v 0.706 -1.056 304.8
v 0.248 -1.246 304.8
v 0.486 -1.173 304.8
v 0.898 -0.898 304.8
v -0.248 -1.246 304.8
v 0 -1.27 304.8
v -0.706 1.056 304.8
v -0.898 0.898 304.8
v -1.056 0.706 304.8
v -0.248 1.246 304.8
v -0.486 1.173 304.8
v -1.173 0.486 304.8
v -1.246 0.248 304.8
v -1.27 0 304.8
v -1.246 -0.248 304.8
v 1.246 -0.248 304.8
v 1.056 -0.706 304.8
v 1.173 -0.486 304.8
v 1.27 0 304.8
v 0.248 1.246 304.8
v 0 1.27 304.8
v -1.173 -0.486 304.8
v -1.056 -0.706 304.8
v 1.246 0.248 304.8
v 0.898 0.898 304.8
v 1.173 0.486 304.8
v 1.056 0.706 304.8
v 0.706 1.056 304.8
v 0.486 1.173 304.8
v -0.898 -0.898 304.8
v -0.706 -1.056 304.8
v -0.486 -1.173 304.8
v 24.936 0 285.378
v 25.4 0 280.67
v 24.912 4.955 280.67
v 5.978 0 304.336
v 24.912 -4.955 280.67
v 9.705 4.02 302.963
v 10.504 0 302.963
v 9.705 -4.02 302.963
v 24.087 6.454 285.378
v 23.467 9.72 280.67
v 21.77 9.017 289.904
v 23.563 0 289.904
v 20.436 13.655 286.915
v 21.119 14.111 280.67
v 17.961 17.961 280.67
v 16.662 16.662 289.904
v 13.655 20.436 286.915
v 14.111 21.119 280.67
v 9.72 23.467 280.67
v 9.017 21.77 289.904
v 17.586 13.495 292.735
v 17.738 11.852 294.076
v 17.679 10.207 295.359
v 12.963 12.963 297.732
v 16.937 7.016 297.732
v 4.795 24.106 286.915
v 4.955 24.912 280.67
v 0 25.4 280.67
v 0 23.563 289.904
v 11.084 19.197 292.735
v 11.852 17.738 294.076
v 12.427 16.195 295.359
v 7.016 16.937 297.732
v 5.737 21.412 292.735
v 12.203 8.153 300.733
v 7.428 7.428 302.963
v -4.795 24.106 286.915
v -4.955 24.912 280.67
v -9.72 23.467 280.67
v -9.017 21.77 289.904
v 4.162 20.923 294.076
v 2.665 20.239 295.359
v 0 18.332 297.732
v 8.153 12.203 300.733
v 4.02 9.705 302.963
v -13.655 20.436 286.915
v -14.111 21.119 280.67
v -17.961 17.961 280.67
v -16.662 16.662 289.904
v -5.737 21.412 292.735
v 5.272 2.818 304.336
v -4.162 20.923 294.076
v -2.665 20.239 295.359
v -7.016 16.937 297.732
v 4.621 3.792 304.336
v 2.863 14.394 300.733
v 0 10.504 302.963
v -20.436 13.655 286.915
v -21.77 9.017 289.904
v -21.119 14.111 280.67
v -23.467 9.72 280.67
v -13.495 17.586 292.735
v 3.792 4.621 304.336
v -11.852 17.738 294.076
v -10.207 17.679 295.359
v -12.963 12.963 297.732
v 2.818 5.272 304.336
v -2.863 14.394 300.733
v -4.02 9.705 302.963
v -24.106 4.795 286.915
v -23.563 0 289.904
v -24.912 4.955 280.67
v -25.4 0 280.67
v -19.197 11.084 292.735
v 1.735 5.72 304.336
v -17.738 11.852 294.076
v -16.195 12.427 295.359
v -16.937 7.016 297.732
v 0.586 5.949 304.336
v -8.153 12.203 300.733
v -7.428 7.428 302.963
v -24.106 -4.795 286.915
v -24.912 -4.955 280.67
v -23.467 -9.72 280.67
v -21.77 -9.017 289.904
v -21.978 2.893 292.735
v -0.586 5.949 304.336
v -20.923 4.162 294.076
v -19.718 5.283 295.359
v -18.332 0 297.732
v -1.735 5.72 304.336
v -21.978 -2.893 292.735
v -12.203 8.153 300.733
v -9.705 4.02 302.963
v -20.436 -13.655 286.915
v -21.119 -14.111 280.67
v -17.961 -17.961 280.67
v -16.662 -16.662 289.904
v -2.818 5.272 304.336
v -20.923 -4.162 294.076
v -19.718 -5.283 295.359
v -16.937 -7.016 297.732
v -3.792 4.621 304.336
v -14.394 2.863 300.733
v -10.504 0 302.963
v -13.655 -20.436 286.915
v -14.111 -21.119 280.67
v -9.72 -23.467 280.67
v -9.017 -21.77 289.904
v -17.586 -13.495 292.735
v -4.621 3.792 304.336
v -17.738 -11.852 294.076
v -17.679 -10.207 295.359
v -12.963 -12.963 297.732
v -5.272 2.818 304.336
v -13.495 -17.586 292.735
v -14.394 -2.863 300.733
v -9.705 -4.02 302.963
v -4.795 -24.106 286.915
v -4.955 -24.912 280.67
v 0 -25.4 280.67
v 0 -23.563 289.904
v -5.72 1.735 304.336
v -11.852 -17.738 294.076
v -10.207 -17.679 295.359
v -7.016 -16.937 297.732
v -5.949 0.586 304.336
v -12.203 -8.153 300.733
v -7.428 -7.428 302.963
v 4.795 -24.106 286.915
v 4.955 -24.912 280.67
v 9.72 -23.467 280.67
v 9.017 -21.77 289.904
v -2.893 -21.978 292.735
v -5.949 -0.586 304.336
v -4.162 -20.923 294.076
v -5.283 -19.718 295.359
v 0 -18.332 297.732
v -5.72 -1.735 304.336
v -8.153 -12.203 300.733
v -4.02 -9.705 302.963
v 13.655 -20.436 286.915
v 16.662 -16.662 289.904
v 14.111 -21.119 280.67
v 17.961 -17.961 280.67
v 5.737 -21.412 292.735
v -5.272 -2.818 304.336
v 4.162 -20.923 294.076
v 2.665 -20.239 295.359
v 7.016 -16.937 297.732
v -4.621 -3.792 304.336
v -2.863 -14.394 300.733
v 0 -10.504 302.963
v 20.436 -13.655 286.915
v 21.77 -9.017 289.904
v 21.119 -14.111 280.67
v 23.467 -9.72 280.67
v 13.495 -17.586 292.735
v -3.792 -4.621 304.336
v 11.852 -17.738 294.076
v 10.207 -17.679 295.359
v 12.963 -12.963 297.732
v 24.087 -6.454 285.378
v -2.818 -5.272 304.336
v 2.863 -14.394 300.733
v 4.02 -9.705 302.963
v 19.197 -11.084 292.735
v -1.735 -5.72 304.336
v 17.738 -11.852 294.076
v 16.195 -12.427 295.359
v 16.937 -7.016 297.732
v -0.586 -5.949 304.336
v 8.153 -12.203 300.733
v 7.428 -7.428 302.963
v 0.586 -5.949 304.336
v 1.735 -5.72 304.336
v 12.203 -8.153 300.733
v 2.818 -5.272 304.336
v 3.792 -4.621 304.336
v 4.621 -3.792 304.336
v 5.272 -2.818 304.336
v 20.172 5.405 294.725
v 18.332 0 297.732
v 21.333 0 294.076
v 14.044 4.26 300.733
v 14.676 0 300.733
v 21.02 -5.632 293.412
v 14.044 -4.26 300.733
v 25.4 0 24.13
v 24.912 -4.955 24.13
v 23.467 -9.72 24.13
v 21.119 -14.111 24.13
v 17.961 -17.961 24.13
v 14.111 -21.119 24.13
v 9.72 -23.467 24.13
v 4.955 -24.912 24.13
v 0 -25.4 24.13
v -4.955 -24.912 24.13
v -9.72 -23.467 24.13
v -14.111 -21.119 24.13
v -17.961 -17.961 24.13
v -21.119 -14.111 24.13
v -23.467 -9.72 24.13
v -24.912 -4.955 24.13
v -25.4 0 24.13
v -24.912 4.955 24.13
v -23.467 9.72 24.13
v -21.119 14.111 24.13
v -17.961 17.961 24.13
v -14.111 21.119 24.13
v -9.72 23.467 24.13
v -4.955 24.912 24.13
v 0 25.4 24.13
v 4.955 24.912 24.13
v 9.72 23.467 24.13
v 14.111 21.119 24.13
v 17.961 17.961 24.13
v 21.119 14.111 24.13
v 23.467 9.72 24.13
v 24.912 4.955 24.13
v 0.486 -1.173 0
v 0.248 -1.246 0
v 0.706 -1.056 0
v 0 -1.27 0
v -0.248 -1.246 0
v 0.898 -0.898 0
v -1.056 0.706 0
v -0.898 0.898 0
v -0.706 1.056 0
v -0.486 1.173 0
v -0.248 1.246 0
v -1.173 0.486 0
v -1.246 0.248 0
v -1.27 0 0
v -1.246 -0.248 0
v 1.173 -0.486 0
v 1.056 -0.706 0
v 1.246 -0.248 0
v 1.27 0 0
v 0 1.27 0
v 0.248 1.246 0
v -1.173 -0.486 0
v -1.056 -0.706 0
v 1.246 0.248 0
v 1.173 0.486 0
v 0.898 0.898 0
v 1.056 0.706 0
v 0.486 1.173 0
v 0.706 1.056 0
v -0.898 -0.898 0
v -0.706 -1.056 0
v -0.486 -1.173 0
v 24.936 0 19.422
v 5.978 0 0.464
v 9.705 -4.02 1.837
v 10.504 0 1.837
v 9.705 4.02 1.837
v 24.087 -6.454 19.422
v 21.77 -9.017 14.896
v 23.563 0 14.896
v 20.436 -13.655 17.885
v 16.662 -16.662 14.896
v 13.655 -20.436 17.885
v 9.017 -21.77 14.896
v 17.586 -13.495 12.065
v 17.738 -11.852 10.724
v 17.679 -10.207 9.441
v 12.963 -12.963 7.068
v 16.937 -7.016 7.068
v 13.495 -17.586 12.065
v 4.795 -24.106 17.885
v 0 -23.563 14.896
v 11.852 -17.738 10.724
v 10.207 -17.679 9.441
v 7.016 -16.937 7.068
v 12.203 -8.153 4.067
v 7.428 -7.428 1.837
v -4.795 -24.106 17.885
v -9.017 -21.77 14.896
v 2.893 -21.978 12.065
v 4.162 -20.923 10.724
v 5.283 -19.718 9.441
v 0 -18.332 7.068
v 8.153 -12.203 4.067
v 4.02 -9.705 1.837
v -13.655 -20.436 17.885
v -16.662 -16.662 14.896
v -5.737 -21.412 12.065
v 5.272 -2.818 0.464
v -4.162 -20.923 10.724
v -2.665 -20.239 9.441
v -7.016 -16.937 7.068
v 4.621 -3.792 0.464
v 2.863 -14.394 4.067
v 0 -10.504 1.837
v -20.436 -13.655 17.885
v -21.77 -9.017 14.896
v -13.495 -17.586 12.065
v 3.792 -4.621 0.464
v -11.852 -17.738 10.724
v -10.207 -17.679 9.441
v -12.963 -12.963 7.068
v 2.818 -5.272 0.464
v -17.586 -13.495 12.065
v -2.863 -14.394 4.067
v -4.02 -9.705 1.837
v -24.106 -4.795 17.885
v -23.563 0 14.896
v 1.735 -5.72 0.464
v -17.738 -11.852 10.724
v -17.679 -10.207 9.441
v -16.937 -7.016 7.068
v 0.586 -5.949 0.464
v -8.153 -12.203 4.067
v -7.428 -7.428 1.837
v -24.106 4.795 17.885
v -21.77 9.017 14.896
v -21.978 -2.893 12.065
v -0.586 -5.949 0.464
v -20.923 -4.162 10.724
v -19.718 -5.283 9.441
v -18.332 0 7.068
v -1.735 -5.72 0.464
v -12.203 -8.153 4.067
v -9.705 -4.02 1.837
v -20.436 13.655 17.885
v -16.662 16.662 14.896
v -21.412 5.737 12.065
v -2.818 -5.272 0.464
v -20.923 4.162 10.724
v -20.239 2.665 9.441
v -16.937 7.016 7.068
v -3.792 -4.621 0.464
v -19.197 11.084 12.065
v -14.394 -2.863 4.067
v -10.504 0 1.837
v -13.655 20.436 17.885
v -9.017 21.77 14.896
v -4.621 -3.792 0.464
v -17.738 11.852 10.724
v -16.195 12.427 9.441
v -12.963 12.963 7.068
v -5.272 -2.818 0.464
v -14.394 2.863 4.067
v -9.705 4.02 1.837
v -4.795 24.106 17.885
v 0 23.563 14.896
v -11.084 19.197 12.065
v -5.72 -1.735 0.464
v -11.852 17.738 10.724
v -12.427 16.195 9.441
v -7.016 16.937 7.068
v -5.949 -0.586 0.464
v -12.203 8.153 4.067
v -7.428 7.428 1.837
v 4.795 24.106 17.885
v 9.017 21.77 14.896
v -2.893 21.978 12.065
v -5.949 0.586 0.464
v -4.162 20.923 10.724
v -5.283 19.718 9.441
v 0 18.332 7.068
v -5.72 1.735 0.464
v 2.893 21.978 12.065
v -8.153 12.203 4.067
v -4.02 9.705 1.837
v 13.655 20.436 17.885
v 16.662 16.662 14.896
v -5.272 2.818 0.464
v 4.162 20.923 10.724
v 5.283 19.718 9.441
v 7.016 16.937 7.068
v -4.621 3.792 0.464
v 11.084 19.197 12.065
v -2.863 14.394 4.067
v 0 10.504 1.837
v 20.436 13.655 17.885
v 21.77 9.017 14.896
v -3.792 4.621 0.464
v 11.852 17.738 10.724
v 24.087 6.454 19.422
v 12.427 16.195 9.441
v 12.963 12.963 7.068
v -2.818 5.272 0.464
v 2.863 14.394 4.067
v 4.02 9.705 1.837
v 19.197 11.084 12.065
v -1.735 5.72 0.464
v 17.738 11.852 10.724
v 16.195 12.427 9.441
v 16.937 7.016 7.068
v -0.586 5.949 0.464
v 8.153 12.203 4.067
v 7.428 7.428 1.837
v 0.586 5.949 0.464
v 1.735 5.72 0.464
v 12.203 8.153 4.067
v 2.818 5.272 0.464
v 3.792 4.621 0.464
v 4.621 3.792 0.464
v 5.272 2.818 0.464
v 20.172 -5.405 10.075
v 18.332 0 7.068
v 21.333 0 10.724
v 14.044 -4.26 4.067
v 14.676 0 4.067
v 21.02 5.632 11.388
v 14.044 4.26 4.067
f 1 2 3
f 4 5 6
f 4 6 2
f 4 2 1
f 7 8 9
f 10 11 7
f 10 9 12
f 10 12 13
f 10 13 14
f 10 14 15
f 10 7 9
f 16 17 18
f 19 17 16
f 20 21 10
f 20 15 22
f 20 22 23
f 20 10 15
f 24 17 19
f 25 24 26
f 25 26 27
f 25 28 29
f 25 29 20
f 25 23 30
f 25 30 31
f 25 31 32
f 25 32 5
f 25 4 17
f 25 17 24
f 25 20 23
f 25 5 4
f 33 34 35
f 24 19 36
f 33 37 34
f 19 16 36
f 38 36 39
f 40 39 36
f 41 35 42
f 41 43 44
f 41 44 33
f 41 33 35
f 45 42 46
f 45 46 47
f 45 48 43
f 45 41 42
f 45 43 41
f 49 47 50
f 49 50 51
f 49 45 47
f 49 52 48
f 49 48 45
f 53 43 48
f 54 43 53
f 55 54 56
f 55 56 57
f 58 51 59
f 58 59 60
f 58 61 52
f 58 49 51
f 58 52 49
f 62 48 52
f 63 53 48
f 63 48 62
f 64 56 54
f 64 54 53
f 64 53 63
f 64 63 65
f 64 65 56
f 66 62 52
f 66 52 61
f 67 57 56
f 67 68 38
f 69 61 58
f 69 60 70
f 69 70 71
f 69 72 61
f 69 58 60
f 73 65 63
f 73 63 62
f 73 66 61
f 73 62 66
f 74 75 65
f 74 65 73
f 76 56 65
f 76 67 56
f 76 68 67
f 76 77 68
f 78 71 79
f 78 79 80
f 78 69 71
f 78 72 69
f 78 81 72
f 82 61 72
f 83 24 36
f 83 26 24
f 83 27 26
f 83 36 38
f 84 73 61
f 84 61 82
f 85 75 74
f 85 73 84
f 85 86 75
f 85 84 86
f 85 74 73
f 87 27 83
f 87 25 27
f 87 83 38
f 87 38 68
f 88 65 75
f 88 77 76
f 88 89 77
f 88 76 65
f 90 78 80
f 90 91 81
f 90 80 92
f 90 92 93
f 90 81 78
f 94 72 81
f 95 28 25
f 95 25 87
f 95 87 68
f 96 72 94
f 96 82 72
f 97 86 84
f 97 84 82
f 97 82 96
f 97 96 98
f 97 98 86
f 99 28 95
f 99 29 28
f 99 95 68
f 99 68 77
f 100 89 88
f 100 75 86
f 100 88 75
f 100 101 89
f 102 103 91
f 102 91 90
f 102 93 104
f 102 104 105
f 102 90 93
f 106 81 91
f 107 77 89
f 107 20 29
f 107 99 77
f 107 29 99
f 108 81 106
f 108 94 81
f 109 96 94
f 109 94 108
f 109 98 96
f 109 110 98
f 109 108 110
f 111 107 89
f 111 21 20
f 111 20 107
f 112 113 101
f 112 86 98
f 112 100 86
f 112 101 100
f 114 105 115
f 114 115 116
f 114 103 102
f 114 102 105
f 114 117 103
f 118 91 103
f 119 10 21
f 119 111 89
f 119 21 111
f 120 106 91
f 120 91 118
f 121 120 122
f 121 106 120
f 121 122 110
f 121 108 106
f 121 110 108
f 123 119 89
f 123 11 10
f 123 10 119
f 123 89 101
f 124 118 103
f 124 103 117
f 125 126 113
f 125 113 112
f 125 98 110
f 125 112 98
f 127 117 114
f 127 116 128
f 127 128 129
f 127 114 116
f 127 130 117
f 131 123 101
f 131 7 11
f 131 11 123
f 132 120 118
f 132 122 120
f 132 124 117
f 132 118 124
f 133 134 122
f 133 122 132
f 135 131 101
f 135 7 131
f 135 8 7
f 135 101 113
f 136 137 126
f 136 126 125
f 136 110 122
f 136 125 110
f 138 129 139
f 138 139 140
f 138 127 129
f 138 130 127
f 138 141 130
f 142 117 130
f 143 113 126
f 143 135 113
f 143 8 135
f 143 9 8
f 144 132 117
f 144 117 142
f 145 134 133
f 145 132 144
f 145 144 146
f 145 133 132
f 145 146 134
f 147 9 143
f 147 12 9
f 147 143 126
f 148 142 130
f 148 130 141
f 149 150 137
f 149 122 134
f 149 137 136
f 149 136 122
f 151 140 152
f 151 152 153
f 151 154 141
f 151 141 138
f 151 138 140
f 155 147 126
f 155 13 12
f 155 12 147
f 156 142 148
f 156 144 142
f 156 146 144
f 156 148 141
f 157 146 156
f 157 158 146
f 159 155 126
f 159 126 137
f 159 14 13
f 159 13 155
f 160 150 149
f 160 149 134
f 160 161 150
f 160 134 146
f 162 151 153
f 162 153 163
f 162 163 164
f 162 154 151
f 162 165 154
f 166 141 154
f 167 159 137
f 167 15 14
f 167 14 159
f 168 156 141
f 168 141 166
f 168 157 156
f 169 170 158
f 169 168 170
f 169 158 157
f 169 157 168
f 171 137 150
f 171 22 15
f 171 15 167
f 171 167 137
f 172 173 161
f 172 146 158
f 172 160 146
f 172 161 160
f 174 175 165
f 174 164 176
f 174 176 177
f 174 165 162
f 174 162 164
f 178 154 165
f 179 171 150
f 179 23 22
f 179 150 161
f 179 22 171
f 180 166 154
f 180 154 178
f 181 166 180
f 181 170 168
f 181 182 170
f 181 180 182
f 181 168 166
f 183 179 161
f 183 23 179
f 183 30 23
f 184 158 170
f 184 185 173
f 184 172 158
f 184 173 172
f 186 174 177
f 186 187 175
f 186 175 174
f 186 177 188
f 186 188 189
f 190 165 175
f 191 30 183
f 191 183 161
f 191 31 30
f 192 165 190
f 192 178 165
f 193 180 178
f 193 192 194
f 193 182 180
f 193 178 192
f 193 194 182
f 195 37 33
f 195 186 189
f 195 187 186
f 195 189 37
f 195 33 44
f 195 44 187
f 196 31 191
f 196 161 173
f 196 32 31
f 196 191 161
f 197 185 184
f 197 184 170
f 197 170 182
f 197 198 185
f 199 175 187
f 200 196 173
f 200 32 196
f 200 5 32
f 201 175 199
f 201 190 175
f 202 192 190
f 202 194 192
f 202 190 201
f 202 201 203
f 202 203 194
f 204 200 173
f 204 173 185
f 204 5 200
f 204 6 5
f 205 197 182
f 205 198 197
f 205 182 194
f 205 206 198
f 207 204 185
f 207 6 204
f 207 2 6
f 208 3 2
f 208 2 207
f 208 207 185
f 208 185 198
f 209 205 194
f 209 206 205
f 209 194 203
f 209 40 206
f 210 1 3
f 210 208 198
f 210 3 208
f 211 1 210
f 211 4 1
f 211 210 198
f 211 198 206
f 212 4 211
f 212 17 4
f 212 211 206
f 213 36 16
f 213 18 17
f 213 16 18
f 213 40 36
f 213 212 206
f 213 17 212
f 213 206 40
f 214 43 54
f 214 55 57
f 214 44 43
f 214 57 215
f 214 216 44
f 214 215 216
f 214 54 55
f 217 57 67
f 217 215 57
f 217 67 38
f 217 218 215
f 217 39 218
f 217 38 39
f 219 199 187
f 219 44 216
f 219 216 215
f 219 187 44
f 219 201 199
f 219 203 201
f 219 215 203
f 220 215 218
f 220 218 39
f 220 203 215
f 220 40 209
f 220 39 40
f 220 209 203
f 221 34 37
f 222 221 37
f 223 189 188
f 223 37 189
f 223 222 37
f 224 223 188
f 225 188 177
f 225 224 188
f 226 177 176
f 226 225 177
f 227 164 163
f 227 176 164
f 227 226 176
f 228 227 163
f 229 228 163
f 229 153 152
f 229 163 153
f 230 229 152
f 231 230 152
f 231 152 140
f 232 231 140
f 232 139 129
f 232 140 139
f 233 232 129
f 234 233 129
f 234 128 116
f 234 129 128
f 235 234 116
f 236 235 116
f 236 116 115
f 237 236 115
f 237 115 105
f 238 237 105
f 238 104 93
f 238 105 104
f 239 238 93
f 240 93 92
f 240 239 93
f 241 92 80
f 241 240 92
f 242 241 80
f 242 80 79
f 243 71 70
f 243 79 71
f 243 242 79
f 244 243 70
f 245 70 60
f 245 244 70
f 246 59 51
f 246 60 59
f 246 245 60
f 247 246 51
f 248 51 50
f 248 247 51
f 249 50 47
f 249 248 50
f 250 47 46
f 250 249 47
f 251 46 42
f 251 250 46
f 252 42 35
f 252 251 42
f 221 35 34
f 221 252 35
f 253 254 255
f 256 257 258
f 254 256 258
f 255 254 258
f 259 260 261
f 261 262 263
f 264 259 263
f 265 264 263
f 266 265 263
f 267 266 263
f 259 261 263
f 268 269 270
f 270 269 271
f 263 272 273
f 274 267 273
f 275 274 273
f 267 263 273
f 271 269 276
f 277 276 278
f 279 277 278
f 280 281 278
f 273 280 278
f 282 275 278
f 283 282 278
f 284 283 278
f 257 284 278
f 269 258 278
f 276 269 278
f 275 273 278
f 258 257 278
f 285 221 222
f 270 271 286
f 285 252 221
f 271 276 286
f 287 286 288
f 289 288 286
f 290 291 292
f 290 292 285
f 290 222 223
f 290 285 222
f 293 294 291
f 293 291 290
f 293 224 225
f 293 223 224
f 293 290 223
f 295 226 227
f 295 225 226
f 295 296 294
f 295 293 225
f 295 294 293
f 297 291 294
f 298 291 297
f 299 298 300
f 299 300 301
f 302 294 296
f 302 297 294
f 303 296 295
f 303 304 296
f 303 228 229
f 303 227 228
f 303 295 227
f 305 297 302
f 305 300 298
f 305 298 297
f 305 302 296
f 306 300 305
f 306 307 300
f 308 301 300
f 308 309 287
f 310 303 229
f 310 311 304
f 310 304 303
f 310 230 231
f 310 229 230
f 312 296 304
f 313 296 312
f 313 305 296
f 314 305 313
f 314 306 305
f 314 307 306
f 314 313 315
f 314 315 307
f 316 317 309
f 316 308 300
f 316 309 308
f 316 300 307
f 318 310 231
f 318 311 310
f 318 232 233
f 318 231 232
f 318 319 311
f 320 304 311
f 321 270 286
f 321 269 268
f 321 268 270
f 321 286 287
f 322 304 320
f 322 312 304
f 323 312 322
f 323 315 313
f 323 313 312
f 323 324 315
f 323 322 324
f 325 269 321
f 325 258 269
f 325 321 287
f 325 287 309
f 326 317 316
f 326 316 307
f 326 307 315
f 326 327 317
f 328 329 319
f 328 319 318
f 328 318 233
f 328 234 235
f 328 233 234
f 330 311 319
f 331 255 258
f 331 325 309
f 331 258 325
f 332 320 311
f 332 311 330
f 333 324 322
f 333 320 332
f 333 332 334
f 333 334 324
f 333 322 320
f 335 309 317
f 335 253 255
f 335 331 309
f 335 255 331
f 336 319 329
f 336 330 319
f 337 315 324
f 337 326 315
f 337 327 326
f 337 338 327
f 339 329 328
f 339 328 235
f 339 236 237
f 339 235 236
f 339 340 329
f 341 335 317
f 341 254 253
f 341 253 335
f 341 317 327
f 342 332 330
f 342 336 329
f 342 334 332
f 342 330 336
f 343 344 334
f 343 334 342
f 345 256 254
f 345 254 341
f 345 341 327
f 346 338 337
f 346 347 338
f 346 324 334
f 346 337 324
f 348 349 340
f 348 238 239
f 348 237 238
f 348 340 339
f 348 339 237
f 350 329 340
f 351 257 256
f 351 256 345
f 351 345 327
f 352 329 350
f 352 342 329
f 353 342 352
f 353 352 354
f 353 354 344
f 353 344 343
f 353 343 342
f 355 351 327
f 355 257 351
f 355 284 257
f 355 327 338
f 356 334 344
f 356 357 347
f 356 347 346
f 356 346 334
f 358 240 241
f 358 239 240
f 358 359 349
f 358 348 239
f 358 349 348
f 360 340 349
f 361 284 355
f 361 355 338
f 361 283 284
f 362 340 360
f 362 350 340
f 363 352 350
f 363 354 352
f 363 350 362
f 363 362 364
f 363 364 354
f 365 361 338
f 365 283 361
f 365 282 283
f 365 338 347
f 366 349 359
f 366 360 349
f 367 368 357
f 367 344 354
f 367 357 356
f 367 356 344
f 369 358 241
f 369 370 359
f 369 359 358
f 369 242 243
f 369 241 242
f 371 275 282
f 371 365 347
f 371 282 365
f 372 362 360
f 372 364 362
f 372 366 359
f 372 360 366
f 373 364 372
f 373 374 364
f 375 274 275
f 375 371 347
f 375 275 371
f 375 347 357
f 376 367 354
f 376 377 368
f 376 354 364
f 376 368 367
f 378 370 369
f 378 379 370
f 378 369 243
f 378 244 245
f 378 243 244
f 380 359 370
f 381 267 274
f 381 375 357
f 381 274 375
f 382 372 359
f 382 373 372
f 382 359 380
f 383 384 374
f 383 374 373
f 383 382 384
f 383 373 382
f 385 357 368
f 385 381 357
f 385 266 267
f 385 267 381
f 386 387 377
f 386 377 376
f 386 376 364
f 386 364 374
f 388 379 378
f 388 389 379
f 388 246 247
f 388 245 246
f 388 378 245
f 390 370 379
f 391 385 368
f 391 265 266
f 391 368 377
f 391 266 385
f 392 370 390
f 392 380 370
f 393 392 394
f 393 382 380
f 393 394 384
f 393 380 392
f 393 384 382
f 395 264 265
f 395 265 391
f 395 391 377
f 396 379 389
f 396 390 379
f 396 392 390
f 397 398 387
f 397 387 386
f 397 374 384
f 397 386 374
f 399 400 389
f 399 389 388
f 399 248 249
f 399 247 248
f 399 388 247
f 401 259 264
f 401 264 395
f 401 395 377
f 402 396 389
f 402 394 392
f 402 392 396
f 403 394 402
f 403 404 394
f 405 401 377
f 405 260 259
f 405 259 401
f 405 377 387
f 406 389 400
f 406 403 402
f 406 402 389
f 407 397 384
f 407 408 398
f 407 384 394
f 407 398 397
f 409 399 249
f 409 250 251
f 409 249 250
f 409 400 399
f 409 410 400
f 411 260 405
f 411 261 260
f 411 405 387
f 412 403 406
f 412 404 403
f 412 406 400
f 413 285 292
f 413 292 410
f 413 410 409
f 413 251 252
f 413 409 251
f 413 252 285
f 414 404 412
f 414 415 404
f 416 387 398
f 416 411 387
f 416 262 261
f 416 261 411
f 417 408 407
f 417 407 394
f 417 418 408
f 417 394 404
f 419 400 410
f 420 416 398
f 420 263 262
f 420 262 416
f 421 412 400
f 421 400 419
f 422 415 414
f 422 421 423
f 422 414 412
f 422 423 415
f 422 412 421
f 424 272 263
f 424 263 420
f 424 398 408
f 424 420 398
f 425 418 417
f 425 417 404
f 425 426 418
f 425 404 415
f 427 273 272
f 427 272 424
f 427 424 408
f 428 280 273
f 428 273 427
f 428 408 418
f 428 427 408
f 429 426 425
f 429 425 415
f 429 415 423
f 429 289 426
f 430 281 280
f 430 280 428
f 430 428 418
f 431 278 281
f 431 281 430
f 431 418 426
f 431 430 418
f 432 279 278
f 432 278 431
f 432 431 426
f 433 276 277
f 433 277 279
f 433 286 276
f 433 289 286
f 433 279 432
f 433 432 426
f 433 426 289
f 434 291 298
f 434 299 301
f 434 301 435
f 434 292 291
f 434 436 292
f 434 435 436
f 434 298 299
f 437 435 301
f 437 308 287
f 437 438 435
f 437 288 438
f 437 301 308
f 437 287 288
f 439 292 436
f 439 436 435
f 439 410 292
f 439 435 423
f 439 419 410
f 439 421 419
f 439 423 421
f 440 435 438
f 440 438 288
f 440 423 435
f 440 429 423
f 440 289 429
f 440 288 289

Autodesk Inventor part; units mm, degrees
ref_plane "YZ Plane" through (0, 0, 0) normal (1, 0, 0) x (0, 1, 0)
ref_plane "XZ Plane" through (0, 0, 0) normal (0, 1, 0) x (-1, 0, 0)
ref_plane "XY Plane" through (0, 0, 0) normal (0, 0, 1) x (1, 0, 0)
sketch "Sketch1" plane through (0, 0, 0) normal (0, 0, 1) x (1, 0, 0)
  circle A0 centre (0, 0) radius 25.4
  dimension "d0" = 50.8
extrude "Extrusion1" add sketch "Sketch1" along normal blind 304.8
fillet "Fillet1" radius 24.13 1 edges at (-25.4, 0, 304.8)
fillet "Fillet2" radius 24.13 1 edges at (-25.4, 0, 0)
properties part number "Air Tank"
